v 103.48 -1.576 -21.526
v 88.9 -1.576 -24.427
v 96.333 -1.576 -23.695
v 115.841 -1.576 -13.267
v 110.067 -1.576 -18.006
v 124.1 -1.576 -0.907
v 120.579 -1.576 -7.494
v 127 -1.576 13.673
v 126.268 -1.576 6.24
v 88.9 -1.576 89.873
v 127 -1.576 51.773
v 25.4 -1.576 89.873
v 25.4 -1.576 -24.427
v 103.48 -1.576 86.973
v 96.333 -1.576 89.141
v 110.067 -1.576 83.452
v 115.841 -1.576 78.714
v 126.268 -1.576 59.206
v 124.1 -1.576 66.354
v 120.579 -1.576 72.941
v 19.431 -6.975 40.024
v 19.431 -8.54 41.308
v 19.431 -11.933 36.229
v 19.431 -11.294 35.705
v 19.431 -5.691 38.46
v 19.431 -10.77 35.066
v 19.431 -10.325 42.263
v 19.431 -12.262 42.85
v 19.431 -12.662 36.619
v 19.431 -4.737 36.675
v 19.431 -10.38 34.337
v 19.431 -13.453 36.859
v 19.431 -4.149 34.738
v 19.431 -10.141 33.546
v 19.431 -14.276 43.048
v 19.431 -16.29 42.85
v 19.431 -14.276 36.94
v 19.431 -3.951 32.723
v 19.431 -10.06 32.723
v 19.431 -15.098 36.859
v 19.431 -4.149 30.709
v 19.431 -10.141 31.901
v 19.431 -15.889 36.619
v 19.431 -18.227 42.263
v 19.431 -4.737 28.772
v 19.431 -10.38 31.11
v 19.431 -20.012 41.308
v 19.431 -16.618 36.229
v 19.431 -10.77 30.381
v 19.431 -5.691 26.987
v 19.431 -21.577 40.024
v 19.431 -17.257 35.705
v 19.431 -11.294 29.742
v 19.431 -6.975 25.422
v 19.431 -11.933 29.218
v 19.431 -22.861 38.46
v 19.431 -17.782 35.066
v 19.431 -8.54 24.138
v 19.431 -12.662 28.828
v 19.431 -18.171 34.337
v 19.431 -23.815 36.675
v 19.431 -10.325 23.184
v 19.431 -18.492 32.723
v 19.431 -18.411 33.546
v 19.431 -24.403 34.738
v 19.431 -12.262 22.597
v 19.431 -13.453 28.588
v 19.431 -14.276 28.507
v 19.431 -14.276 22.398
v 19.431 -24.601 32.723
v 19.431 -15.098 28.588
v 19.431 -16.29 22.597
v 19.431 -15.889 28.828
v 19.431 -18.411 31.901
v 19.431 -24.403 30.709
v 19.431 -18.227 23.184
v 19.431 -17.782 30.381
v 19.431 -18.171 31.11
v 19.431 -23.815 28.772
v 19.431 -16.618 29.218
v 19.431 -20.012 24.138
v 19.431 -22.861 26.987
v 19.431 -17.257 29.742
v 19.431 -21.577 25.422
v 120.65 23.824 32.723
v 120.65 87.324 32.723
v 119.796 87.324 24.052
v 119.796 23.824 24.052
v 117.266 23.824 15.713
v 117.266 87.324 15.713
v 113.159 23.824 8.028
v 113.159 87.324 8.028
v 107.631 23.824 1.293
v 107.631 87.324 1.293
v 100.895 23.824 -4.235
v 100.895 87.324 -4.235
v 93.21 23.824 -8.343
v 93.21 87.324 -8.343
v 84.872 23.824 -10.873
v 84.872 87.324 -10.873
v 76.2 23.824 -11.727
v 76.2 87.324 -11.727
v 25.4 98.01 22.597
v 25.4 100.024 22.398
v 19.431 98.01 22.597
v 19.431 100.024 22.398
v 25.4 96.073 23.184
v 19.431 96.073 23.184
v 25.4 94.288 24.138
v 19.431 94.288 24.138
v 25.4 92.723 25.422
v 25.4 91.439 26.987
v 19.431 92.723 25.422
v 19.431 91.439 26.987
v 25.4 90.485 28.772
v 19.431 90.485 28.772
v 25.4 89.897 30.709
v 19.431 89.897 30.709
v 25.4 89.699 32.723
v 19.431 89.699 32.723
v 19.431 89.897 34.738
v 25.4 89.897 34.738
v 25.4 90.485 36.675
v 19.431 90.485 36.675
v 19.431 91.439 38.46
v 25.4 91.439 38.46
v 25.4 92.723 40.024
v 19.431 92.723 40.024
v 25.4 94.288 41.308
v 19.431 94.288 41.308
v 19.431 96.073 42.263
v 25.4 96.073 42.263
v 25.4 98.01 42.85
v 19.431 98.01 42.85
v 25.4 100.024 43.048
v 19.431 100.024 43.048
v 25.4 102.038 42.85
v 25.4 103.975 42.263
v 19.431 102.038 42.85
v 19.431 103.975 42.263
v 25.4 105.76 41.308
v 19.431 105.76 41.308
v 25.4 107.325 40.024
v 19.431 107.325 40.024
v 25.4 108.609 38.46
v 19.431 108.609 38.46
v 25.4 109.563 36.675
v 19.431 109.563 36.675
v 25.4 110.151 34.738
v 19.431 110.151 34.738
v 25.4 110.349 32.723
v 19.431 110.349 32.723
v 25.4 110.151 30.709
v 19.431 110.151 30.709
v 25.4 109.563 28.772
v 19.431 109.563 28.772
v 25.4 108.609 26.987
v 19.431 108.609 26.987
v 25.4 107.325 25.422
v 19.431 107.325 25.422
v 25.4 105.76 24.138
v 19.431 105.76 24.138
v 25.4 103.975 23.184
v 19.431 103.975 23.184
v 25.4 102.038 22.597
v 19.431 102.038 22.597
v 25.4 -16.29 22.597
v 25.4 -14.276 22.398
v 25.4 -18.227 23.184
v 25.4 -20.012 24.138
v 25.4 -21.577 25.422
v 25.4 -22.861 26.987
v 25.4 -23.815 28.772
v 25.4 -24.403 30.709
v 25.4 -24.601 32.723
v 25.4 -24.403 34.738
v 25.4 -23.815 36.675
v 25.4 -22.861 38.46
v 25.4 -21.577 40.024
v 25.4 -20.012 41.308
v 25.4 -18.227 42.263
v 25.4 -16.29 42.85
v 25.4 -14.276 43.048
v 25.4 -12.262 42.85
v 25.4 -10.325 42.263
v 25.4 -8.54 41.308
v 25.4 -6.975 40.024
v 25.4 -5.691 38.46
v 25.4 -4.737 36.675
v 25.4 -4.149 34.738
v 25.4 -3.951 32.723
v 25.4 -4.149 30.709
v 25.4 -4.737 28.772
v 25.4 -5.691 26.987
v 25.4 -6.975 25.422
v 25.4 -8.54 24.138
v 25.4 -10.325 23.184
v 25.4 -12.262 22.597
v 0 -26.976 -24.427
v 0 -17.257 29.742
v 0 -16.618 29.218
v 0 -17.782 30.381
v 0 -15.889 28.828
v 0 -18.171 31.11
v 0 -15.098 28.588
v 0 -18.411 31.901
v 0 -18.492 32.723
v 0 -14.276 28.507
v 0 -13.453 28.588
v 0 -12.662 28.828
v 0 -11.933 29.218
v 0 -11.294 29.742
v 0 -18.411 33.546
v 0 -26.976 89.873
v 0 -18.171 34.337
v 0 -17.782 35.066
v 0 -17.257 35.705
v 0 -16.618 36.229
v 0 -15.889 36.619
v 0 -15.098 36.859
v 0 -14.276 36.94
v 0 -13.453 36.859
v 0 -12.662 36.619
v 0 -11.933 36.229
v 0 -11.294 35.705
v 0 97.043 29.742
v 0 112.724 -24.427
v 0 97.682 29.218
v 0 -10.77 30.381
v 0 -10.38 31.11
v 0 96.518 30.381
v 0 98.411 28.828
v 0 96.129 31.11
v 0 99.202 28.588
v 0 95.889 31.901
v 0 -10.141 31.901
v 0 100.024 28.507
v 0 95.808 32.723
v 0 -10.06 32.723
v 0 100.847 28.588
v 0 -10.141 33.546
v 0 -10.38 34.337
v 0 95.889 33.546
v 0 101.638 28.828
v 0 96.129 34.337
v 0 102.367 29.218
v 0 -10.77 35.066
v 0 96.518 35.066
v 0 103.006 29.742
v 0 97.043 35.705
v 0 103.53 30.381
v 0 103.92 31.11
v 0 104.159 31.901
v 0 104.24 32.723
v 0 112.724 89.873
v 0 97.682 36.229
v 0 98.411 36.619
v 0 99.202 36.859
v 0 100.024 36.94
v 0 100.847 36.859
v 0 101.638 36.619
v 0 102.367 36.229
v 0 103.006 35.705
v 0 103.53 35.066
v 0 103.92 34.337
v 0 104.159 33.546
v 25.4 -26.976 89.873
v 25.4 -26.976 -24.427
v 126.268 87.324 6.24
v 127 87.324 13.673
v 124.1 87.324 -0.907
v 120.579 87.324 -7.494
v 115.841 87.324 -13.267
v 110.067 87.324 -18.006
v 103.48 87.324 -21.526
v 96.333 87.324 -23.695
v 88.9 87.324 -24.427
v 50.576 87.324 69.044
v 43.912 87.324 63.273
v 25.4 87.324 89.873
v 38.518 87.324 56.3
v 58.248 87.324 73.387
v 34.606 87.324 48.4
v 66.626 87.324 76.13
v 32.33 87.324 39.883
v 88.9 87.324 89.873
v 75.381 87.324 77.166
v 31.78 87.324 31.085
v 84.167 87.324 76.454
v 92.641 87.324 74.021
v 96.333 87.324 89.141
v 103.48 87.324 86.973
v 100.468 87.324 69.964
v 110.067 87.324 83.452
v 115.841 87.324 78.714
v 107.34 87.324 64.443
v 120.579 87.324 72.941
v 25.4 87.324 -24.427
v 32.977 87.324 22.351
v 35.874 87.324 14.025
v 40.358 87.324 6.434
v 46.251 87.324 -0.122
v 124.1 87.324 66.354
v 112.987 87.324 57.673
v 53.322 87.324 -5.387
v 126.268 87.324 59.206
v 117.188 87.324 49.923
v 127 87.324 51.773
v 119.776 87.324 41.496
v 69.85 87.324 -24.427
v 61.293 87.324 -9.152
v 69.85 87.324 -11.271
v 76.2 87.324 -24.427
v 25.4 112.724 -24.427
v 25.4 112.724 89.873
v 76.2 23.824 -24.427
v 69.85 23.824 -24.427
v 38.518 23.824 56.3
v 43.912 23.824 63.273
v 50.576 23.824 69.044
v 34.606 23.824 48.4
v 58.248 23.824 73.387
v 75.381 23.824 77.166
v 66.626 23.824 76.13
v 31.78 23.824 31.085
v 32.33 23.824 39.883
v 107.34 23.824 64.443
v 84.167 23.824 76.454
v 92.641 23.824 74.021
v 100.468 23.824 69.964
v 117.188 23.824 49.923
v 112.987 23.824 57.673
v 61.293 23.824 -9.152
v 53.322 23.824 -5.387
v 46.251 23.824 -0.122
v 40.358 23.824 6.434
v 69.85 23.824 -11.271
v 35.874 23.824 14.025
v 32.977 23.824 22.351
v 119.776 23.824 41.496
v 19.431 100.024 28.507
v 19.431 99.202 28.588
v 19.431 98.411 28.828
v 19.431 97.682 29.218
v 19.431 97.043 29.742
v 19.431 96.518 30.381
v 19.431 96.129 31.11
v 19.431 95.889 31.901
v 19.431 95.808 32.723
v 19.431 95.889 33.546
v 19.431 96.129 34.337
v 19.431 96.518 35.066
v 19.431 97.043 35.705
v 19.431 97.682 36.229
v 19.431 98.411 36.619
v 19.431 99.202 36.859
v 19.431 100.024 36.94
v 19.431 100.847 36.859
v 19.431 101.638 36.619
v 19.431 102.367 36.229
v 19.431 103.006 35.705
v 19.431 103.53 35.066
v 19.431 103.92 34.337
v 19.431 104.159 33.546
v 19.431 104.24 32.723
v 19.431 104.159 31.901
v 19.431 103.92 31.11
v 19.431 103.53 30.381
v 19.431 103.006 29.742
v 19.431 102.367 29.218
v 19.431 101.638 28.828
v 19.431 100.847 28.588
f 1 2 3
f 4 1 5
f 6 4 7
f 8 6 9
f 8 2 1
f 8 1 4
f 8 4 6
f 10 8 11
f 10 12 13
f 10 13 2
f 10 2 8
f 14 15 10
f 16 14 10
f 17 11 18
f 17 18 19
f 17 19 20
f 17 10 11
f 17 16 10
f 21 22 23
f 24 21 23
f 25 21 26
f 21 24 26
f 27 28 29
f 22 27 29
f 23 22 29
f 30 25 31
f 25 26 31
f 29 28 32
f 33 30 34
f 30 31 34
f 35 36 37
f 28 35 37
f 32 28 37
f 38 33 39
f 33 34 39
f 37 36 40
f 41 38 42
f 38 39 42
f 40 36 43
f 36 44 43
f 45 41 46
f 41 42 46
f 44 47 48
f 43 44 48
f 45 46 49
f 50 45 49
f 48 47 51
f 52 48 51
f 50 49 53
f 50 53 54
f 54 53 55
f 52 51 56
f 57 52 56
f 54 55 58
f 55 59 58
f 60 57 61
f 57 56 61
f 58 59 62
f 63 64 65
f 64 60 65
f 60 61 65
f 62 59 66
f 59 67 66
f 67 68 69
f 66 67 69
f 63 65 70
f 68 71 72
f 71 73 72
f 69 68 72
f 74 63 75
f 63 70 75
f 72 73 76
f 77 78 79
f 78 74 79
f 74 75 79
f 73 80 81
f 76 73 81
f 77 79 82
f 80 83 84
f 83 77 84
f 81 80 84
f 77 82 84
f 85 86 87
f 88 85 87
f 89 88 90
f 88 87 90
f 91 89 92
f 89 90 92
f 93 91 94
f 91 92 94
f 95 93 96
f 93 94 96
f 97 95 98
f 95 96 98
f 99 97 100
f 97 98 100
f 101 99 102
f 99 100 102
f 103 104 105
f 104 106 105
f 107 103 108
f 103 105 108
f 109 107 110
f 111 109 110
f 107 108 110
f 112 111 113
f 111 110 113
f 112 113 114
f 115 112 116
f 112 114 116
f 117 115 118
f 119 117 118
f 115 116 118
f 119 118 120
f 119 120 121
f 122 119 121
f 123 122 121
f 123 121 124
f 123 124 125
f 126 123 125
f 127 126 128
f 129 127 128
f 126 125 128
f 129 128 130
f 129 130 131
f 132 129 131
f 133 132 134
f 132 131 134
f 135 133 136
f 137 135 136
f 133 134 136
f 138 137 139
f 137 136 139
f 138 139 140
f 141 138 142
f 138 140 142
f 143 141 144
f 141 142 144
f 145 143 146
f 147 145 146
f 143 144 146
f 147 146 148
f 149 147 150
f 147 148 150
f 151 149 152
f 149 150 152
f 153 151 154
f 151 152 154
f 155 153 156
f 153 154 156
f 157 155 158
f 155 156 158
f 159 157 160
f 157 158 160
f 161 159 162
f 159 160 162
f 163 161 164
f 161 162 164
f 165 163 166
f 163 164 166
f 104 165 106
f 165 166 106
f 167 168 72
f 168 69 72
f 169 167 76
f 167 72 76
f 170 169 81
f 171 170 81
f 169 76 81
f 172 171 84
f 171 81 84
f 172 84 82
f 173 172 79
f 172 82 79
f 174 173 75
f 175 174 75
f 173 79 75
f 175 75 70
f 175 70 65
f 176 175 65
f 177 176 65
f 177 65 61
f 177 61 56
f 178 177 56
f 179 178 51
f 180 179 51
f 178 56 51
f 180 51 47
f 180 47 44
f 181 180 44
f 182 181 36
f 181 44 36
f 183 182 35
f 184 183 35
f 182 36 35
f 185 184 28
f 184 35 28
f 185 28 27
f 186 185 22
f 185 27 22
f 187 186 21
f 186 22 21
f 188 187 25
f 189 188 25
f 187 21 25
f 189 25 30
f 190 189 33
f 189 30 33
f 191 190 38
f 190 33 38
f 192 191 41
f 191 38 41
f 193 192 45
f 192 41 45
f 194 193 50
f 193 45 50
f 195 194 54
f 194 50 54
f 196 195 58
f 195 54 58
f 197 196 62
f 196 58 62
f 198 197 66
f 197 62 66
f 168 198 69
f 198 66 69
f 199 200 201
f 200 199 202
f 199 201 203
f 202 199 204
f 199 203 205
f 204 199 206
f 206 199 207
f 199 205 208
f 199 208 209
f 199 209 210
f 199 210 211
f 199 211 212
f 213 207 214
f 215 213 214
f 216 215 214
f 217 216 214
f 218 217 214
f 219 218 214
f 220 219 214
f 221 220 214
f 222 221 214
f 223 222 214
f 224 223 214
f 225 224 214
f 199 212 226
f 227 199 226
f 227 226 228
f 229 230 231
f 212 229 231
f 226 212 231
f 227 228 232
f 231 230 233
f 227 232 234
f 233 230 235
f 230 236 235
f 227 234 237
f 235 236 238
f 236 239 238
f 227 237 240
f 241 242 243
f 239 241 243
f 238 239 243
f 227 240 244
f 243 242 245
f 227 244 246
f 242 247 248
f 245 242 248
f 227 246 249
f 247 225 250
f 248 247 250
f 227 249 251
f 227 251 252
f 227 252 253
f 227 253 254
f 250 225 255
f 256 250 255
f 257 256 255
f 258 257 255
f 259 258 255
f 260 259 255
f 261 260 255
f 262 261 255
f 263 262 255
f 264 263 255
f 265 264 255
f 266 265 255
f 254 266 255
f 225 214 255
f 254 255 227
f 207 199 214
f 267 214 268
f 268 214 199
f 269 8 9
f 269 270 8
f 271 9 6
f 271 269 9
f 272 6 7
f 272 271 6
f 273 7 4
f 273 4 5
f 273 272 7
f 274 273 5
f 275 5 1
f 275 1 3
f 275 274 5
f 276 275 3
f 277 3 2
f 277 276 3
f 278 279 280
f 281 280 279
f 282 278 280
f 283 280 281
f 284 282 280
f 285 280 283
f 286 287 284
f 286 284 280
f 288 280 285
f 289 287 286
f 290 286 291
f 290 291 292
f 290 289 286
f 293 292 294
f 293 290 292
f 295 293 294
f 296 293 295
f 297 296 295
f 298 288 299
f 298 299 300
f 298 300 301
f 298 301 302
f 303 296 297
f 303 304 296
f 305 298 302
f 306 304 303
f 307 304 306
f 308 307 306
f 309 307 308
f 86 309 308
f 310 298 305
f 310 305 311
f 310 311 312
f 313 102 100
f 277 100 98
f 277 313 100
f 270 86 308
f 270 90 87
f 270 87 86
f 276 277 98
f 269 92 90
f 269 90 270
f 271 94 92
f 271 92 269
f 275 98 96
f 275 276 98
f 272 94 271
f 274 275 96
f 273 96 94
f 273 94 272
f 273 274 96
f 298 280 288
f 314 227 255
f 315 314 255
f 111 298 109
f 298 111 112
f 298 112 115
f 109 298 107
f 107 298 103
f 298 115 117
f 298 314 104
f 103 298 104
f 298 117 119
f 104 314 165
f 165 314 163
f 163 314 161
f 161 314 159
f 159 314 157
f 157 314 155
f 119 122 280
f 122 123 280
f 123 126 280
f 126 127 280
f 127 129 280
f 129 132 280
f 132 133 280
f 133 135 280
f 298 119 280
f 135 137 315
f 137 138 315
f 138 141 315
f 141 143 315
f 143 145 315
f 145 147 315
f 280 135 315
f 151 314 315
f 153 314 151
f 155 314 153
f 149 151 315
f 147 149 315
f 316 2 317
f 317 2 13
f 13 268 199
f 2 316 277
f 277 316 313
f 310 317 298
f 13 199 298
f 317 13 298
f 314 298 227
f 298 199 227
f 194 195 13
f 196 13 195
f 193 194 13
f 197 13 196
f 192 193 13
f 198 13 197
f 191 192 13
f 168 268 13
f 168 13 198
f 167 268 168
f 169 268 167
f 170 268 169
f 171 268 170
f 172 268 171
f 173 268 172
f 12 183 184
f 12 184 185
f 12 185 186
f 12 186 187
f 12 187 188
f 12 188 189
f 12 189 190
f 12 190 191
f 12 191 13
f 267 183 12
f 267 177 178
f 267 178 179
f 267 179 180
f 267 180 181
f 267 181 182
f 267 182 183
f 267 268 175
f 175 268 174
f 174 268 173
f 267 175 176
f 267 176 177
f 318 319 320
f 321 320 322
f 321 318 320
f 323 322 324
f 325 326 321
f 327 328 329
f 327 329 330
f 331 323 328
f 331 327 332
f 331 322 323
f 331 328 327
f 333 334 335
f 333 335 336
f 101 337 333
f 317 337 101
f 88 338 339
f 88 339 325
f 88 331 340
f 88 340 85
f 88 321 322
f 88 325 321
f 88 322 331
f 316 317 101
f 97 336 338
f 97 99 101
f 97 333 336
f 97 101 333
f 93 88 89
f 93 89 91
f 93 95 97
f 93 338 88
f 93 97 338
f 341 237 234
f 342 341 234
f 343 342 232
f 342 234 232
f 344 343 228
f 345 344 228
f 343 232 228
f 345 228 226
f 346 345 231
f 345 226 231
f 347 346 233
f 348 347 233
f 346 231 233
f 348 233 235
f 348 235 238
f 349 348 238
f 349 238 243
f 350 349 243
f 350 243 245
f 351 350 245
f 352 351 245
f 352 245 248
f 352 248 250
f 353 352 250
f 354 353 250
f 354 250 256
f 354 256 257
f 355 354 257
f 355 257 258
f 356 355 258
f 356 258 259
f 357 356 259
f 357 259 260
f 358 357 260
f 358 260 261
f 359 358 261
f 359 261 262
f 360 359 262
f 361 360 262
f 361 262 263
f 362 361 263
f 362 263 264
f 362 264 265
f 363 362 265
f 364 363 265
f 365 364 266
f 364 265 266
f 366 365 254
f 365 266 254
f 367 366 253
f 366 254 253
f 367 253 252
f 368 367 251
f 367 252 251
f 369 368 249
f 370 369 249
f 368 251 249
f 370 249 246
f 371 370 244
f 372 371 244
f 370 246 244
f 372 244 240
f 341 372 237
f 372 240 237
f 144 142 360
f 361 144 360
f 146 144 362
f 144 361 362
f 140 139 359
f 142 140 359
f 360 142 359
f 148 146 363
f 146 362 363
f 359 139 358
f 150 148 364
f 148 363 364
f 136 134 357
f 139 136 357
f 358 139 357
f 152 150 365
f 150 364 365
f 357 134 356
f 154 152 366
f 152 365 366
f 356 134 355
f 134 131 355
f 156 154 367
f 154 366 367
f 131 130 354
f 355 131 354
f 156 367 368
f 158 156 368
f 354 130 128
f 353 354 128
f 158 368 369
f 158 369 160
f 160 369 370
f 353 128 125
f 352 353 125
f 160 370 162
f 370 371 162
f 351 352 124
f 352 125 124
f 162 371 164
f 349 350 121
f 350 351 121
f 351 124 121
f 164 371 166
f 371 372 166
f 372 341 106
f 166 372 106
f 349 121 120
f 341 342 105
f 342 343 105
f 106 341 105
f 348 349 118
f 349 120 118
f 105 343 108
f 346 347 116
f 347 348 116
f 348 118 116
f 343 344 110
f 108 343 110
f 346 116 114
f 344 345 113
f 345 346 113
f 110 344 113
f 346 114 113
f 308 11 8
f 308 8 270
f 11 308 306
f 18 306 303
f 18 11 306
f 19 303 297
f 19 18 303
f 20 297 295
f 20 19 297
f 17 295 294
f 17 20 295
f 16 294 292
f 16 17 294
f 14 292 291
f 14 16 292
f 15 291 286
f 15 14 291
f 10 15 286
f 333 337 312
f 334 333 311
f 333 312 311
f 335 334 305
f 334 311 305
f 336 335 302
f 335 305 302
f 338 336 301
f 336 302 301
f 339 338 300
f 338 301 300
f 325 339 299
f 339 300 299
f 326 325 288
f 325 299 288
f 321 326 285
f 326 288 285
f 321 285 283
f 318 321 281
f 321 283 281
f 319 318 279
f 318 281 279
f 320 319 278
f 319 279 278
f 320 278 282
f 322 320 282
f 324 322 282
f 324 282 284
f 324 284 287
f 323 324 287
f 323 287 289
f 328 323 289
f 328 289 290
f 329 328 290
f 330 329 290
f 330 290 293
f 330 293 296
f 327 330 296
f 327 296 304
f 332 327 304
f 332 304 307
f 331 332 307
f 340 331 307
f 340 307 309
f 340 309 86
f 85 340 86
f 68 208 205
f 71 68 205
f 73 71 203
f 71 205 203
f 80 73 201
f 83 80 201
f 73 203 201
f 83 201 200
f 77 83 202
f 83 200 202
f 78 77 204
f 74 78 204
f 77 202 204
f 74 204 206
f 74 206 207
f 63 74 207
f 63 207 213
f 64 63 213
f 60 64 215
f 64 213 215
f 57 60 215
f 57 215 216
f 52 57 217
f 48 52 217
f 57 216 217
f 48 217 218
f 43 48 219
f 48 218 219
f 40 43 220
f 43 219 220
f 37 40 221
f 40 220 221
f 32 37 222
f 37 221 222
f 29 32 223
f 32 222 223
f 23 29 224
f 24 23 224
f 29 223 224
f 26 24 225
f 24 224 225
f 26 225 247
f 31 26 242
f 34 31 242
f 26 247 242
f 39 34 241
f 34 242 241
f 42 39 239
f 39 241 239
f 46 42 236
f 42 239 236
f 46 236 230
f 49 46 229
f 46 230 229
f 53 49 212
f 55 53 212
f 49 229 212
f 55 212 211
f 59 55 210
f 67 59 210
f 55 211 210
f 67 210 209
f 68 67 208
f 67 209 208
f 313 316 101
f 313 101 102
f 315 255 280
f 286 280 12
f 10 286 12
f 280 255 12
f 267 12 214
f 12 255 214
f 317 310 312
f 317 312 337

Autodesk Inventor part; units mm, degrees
ref_plane "YZ Plane" through (0, 0, 0) normal (1, 0, 0) x (0, 1, 0)
ref_plane "XZ Plane" through (0, 0, 0) normal (0, 1, 0) x (-1, 0, 0)
ref_plane "XY Plane" through (0, 0, 0) normal (0, 0, 1) x (1, 0, 0)
sketch "Sketch1" plane through (0, 0, 0) normal (1, 0, 0) x (0, 1, 0)
  line L0 (112.7241, 89.8734) -> (-26.9759, 89.8734)
  line L1 (-26.9759, 89.8734) -> (-26.9759, -24.4266)
  line L2 (-26.9759, -24.4266) -> (112.7241, -24.4266)
  line L3 (112.7241, -24.4266) -> (112.7241, 89.8734)
  point P0 (0, 0)
  dimension "d0" = 114.3
  dimension "d1" = 139.7
extrude "Extrusion1" add sketch "Sketch1" along normal blind 127
sketch "Sketch2" plane through (0, 112.7241, 89.8734) normal (0, 1, 0) x (1, 0, 0)
  line L0 (0, 0) -> (127, 0) projected
  line L1 (0, 114.3) -> (127, 114.3) projected
  line L2 (25.4, 0) -> (127, 0)
  line L3 (127, 0) -> (127, 114.3)
  line L4 (127, 114.3) -> (25.4, 114.3)
  line L5 (25.4, 114.3) -> (25.4, 0)
  line L6 (0, 114.3) -> (0, 0) projected
  point P0 (0, 89.8734)
  dimension "d4" = 25.4
extrude "Extrusion2" cut sketch "Sketch2" against normal blind 25.4 contours L5 L1 L3 L0
sketch "Sketch4" plane through (0, 87.3241, 89.8734) normal (0, 1, 0) x (1, 0, 0)
  line L0 (38.1, 127) -> (38.1, 0) projected
  circle A0 centre (76.2, 57.15) radius 44.45
  line L1 (127, 114.3) -> (127, 0) projected
  line L2 (127, 0) -> (25.4, 0) projected
  point P0 (0, 89.8734)
  dimension "d15" = 50.8
  dimension "d16" = 57.15
  dimension "d54" = 88.9
extrude "Extrusion4" cut sketch "Sketch4" against normal blind 63.5
fillet "Fillet3" radius 38.1 1 edges at (127, 30.1741, 89.8734)
fillet "Fillet4" radius 38.1 1 edges at (127, 30.1741, -24.4266)
sketch "Sketch9" plane through (25.4, 112.7241, 89.8734) normal (1, 0, 0) x (0, 0, -1)
  line L0 (0, 0) -> (114.3, 0) projected
  line L1 (0, -25.4) -> (0, 0) projected
  point P0 (89.8734, -112.7241)
  point P1 (57.15, -12.7)
  dimension "d30" = 12.7
  dimension "d31" = 57.15
hole "Hole1" at (25.4, 100.0241, 32.7234) direction (-1, 0, 0) diameter 8.4328 end through all counterbore diameter 20.6502 counterbore depth 5.969 clearance for "Hex Head Bolt" size "5/16" standard "Ansi Unified Screw Threads"
sketch "Sketch10" plane through (0, -26.9759, -24.4266) normal (0, -1, 0) x (1, 0, 0)
  line L0 (0, 114.3) -> (88.9, 114.3) projected
  line L1 (25.4, 114.3) -> (127, 114.3)
  line L2 (127, 114.3) -> (127, 0)
  line L3 (127, 0) -> (25.4, 0)
  line L4 (25.4, 0) -> (25.4, 114.3)
  line L5 (0, 114.3) -> (0, 0) projected
  point P0 (0, 24.4266)
  dimension "d39" = 25.4
  dimension "d42" = 114.3
  dimension "d60" = 101.6
extrude "Extrusion6" cut sketch "Sketch10" against normal blind 25.4
sketch "Sketch11" plane through (25.4, -26.9759, 89.8734) normal (1, 0, 0) x (0, 0, -1)
  line L0 (114.3, 0) -> (0, 0) projected
  line L1 (114.3, 25.4) -> (114.3, 0) projected
  point P0 (89.8734, 26.9759)
  point P1 (57.15, 12.7)
  dimension "d43" = 12.7
  dimension "d44" = 57.15
hole "Hole2" at (25.4, -14.2759, 32.7234) direction (-1, 0, 0) diameter 8.4328 end through all counterbore diameter 20.6502 counterbore depth 5.969 clearance for "Hex Head Bolt" size "5/16" standard "Ansi Unified Screw Threads"
sketch "Sketch15" plane through (0, -26.9759, -24.4266) normal (0, 0, -1) x (-1, 0, 0)
  line L0 (-25.4, 114.3) -> (-88.9, 114.3) projected
  line L1 (-76.2, 114.3) -> (-69.85, 114.3)
  line L2 (-69.85, 114.3) -> (-69.85, 50.8)
  line L3 (-69.85, 50.8) -> (-76.2, 50.8)
  line L4 (-76.2, 50.8) -> (-76.2, 114.3)
  line L5 (-127, 114.3) -> (-127, 0) projected
  point P0 (0, 26.9759)
  point P1 (-127, 25.4)
  dimension "d55" = 6.35
  dimension "d56" = 50.8
  dimension "d57" = 63.5
extrude "Extrusion8" cut sketch "Sketch15" against normal blind 25.4
properties part number "Cleaning Bottle Holder"
